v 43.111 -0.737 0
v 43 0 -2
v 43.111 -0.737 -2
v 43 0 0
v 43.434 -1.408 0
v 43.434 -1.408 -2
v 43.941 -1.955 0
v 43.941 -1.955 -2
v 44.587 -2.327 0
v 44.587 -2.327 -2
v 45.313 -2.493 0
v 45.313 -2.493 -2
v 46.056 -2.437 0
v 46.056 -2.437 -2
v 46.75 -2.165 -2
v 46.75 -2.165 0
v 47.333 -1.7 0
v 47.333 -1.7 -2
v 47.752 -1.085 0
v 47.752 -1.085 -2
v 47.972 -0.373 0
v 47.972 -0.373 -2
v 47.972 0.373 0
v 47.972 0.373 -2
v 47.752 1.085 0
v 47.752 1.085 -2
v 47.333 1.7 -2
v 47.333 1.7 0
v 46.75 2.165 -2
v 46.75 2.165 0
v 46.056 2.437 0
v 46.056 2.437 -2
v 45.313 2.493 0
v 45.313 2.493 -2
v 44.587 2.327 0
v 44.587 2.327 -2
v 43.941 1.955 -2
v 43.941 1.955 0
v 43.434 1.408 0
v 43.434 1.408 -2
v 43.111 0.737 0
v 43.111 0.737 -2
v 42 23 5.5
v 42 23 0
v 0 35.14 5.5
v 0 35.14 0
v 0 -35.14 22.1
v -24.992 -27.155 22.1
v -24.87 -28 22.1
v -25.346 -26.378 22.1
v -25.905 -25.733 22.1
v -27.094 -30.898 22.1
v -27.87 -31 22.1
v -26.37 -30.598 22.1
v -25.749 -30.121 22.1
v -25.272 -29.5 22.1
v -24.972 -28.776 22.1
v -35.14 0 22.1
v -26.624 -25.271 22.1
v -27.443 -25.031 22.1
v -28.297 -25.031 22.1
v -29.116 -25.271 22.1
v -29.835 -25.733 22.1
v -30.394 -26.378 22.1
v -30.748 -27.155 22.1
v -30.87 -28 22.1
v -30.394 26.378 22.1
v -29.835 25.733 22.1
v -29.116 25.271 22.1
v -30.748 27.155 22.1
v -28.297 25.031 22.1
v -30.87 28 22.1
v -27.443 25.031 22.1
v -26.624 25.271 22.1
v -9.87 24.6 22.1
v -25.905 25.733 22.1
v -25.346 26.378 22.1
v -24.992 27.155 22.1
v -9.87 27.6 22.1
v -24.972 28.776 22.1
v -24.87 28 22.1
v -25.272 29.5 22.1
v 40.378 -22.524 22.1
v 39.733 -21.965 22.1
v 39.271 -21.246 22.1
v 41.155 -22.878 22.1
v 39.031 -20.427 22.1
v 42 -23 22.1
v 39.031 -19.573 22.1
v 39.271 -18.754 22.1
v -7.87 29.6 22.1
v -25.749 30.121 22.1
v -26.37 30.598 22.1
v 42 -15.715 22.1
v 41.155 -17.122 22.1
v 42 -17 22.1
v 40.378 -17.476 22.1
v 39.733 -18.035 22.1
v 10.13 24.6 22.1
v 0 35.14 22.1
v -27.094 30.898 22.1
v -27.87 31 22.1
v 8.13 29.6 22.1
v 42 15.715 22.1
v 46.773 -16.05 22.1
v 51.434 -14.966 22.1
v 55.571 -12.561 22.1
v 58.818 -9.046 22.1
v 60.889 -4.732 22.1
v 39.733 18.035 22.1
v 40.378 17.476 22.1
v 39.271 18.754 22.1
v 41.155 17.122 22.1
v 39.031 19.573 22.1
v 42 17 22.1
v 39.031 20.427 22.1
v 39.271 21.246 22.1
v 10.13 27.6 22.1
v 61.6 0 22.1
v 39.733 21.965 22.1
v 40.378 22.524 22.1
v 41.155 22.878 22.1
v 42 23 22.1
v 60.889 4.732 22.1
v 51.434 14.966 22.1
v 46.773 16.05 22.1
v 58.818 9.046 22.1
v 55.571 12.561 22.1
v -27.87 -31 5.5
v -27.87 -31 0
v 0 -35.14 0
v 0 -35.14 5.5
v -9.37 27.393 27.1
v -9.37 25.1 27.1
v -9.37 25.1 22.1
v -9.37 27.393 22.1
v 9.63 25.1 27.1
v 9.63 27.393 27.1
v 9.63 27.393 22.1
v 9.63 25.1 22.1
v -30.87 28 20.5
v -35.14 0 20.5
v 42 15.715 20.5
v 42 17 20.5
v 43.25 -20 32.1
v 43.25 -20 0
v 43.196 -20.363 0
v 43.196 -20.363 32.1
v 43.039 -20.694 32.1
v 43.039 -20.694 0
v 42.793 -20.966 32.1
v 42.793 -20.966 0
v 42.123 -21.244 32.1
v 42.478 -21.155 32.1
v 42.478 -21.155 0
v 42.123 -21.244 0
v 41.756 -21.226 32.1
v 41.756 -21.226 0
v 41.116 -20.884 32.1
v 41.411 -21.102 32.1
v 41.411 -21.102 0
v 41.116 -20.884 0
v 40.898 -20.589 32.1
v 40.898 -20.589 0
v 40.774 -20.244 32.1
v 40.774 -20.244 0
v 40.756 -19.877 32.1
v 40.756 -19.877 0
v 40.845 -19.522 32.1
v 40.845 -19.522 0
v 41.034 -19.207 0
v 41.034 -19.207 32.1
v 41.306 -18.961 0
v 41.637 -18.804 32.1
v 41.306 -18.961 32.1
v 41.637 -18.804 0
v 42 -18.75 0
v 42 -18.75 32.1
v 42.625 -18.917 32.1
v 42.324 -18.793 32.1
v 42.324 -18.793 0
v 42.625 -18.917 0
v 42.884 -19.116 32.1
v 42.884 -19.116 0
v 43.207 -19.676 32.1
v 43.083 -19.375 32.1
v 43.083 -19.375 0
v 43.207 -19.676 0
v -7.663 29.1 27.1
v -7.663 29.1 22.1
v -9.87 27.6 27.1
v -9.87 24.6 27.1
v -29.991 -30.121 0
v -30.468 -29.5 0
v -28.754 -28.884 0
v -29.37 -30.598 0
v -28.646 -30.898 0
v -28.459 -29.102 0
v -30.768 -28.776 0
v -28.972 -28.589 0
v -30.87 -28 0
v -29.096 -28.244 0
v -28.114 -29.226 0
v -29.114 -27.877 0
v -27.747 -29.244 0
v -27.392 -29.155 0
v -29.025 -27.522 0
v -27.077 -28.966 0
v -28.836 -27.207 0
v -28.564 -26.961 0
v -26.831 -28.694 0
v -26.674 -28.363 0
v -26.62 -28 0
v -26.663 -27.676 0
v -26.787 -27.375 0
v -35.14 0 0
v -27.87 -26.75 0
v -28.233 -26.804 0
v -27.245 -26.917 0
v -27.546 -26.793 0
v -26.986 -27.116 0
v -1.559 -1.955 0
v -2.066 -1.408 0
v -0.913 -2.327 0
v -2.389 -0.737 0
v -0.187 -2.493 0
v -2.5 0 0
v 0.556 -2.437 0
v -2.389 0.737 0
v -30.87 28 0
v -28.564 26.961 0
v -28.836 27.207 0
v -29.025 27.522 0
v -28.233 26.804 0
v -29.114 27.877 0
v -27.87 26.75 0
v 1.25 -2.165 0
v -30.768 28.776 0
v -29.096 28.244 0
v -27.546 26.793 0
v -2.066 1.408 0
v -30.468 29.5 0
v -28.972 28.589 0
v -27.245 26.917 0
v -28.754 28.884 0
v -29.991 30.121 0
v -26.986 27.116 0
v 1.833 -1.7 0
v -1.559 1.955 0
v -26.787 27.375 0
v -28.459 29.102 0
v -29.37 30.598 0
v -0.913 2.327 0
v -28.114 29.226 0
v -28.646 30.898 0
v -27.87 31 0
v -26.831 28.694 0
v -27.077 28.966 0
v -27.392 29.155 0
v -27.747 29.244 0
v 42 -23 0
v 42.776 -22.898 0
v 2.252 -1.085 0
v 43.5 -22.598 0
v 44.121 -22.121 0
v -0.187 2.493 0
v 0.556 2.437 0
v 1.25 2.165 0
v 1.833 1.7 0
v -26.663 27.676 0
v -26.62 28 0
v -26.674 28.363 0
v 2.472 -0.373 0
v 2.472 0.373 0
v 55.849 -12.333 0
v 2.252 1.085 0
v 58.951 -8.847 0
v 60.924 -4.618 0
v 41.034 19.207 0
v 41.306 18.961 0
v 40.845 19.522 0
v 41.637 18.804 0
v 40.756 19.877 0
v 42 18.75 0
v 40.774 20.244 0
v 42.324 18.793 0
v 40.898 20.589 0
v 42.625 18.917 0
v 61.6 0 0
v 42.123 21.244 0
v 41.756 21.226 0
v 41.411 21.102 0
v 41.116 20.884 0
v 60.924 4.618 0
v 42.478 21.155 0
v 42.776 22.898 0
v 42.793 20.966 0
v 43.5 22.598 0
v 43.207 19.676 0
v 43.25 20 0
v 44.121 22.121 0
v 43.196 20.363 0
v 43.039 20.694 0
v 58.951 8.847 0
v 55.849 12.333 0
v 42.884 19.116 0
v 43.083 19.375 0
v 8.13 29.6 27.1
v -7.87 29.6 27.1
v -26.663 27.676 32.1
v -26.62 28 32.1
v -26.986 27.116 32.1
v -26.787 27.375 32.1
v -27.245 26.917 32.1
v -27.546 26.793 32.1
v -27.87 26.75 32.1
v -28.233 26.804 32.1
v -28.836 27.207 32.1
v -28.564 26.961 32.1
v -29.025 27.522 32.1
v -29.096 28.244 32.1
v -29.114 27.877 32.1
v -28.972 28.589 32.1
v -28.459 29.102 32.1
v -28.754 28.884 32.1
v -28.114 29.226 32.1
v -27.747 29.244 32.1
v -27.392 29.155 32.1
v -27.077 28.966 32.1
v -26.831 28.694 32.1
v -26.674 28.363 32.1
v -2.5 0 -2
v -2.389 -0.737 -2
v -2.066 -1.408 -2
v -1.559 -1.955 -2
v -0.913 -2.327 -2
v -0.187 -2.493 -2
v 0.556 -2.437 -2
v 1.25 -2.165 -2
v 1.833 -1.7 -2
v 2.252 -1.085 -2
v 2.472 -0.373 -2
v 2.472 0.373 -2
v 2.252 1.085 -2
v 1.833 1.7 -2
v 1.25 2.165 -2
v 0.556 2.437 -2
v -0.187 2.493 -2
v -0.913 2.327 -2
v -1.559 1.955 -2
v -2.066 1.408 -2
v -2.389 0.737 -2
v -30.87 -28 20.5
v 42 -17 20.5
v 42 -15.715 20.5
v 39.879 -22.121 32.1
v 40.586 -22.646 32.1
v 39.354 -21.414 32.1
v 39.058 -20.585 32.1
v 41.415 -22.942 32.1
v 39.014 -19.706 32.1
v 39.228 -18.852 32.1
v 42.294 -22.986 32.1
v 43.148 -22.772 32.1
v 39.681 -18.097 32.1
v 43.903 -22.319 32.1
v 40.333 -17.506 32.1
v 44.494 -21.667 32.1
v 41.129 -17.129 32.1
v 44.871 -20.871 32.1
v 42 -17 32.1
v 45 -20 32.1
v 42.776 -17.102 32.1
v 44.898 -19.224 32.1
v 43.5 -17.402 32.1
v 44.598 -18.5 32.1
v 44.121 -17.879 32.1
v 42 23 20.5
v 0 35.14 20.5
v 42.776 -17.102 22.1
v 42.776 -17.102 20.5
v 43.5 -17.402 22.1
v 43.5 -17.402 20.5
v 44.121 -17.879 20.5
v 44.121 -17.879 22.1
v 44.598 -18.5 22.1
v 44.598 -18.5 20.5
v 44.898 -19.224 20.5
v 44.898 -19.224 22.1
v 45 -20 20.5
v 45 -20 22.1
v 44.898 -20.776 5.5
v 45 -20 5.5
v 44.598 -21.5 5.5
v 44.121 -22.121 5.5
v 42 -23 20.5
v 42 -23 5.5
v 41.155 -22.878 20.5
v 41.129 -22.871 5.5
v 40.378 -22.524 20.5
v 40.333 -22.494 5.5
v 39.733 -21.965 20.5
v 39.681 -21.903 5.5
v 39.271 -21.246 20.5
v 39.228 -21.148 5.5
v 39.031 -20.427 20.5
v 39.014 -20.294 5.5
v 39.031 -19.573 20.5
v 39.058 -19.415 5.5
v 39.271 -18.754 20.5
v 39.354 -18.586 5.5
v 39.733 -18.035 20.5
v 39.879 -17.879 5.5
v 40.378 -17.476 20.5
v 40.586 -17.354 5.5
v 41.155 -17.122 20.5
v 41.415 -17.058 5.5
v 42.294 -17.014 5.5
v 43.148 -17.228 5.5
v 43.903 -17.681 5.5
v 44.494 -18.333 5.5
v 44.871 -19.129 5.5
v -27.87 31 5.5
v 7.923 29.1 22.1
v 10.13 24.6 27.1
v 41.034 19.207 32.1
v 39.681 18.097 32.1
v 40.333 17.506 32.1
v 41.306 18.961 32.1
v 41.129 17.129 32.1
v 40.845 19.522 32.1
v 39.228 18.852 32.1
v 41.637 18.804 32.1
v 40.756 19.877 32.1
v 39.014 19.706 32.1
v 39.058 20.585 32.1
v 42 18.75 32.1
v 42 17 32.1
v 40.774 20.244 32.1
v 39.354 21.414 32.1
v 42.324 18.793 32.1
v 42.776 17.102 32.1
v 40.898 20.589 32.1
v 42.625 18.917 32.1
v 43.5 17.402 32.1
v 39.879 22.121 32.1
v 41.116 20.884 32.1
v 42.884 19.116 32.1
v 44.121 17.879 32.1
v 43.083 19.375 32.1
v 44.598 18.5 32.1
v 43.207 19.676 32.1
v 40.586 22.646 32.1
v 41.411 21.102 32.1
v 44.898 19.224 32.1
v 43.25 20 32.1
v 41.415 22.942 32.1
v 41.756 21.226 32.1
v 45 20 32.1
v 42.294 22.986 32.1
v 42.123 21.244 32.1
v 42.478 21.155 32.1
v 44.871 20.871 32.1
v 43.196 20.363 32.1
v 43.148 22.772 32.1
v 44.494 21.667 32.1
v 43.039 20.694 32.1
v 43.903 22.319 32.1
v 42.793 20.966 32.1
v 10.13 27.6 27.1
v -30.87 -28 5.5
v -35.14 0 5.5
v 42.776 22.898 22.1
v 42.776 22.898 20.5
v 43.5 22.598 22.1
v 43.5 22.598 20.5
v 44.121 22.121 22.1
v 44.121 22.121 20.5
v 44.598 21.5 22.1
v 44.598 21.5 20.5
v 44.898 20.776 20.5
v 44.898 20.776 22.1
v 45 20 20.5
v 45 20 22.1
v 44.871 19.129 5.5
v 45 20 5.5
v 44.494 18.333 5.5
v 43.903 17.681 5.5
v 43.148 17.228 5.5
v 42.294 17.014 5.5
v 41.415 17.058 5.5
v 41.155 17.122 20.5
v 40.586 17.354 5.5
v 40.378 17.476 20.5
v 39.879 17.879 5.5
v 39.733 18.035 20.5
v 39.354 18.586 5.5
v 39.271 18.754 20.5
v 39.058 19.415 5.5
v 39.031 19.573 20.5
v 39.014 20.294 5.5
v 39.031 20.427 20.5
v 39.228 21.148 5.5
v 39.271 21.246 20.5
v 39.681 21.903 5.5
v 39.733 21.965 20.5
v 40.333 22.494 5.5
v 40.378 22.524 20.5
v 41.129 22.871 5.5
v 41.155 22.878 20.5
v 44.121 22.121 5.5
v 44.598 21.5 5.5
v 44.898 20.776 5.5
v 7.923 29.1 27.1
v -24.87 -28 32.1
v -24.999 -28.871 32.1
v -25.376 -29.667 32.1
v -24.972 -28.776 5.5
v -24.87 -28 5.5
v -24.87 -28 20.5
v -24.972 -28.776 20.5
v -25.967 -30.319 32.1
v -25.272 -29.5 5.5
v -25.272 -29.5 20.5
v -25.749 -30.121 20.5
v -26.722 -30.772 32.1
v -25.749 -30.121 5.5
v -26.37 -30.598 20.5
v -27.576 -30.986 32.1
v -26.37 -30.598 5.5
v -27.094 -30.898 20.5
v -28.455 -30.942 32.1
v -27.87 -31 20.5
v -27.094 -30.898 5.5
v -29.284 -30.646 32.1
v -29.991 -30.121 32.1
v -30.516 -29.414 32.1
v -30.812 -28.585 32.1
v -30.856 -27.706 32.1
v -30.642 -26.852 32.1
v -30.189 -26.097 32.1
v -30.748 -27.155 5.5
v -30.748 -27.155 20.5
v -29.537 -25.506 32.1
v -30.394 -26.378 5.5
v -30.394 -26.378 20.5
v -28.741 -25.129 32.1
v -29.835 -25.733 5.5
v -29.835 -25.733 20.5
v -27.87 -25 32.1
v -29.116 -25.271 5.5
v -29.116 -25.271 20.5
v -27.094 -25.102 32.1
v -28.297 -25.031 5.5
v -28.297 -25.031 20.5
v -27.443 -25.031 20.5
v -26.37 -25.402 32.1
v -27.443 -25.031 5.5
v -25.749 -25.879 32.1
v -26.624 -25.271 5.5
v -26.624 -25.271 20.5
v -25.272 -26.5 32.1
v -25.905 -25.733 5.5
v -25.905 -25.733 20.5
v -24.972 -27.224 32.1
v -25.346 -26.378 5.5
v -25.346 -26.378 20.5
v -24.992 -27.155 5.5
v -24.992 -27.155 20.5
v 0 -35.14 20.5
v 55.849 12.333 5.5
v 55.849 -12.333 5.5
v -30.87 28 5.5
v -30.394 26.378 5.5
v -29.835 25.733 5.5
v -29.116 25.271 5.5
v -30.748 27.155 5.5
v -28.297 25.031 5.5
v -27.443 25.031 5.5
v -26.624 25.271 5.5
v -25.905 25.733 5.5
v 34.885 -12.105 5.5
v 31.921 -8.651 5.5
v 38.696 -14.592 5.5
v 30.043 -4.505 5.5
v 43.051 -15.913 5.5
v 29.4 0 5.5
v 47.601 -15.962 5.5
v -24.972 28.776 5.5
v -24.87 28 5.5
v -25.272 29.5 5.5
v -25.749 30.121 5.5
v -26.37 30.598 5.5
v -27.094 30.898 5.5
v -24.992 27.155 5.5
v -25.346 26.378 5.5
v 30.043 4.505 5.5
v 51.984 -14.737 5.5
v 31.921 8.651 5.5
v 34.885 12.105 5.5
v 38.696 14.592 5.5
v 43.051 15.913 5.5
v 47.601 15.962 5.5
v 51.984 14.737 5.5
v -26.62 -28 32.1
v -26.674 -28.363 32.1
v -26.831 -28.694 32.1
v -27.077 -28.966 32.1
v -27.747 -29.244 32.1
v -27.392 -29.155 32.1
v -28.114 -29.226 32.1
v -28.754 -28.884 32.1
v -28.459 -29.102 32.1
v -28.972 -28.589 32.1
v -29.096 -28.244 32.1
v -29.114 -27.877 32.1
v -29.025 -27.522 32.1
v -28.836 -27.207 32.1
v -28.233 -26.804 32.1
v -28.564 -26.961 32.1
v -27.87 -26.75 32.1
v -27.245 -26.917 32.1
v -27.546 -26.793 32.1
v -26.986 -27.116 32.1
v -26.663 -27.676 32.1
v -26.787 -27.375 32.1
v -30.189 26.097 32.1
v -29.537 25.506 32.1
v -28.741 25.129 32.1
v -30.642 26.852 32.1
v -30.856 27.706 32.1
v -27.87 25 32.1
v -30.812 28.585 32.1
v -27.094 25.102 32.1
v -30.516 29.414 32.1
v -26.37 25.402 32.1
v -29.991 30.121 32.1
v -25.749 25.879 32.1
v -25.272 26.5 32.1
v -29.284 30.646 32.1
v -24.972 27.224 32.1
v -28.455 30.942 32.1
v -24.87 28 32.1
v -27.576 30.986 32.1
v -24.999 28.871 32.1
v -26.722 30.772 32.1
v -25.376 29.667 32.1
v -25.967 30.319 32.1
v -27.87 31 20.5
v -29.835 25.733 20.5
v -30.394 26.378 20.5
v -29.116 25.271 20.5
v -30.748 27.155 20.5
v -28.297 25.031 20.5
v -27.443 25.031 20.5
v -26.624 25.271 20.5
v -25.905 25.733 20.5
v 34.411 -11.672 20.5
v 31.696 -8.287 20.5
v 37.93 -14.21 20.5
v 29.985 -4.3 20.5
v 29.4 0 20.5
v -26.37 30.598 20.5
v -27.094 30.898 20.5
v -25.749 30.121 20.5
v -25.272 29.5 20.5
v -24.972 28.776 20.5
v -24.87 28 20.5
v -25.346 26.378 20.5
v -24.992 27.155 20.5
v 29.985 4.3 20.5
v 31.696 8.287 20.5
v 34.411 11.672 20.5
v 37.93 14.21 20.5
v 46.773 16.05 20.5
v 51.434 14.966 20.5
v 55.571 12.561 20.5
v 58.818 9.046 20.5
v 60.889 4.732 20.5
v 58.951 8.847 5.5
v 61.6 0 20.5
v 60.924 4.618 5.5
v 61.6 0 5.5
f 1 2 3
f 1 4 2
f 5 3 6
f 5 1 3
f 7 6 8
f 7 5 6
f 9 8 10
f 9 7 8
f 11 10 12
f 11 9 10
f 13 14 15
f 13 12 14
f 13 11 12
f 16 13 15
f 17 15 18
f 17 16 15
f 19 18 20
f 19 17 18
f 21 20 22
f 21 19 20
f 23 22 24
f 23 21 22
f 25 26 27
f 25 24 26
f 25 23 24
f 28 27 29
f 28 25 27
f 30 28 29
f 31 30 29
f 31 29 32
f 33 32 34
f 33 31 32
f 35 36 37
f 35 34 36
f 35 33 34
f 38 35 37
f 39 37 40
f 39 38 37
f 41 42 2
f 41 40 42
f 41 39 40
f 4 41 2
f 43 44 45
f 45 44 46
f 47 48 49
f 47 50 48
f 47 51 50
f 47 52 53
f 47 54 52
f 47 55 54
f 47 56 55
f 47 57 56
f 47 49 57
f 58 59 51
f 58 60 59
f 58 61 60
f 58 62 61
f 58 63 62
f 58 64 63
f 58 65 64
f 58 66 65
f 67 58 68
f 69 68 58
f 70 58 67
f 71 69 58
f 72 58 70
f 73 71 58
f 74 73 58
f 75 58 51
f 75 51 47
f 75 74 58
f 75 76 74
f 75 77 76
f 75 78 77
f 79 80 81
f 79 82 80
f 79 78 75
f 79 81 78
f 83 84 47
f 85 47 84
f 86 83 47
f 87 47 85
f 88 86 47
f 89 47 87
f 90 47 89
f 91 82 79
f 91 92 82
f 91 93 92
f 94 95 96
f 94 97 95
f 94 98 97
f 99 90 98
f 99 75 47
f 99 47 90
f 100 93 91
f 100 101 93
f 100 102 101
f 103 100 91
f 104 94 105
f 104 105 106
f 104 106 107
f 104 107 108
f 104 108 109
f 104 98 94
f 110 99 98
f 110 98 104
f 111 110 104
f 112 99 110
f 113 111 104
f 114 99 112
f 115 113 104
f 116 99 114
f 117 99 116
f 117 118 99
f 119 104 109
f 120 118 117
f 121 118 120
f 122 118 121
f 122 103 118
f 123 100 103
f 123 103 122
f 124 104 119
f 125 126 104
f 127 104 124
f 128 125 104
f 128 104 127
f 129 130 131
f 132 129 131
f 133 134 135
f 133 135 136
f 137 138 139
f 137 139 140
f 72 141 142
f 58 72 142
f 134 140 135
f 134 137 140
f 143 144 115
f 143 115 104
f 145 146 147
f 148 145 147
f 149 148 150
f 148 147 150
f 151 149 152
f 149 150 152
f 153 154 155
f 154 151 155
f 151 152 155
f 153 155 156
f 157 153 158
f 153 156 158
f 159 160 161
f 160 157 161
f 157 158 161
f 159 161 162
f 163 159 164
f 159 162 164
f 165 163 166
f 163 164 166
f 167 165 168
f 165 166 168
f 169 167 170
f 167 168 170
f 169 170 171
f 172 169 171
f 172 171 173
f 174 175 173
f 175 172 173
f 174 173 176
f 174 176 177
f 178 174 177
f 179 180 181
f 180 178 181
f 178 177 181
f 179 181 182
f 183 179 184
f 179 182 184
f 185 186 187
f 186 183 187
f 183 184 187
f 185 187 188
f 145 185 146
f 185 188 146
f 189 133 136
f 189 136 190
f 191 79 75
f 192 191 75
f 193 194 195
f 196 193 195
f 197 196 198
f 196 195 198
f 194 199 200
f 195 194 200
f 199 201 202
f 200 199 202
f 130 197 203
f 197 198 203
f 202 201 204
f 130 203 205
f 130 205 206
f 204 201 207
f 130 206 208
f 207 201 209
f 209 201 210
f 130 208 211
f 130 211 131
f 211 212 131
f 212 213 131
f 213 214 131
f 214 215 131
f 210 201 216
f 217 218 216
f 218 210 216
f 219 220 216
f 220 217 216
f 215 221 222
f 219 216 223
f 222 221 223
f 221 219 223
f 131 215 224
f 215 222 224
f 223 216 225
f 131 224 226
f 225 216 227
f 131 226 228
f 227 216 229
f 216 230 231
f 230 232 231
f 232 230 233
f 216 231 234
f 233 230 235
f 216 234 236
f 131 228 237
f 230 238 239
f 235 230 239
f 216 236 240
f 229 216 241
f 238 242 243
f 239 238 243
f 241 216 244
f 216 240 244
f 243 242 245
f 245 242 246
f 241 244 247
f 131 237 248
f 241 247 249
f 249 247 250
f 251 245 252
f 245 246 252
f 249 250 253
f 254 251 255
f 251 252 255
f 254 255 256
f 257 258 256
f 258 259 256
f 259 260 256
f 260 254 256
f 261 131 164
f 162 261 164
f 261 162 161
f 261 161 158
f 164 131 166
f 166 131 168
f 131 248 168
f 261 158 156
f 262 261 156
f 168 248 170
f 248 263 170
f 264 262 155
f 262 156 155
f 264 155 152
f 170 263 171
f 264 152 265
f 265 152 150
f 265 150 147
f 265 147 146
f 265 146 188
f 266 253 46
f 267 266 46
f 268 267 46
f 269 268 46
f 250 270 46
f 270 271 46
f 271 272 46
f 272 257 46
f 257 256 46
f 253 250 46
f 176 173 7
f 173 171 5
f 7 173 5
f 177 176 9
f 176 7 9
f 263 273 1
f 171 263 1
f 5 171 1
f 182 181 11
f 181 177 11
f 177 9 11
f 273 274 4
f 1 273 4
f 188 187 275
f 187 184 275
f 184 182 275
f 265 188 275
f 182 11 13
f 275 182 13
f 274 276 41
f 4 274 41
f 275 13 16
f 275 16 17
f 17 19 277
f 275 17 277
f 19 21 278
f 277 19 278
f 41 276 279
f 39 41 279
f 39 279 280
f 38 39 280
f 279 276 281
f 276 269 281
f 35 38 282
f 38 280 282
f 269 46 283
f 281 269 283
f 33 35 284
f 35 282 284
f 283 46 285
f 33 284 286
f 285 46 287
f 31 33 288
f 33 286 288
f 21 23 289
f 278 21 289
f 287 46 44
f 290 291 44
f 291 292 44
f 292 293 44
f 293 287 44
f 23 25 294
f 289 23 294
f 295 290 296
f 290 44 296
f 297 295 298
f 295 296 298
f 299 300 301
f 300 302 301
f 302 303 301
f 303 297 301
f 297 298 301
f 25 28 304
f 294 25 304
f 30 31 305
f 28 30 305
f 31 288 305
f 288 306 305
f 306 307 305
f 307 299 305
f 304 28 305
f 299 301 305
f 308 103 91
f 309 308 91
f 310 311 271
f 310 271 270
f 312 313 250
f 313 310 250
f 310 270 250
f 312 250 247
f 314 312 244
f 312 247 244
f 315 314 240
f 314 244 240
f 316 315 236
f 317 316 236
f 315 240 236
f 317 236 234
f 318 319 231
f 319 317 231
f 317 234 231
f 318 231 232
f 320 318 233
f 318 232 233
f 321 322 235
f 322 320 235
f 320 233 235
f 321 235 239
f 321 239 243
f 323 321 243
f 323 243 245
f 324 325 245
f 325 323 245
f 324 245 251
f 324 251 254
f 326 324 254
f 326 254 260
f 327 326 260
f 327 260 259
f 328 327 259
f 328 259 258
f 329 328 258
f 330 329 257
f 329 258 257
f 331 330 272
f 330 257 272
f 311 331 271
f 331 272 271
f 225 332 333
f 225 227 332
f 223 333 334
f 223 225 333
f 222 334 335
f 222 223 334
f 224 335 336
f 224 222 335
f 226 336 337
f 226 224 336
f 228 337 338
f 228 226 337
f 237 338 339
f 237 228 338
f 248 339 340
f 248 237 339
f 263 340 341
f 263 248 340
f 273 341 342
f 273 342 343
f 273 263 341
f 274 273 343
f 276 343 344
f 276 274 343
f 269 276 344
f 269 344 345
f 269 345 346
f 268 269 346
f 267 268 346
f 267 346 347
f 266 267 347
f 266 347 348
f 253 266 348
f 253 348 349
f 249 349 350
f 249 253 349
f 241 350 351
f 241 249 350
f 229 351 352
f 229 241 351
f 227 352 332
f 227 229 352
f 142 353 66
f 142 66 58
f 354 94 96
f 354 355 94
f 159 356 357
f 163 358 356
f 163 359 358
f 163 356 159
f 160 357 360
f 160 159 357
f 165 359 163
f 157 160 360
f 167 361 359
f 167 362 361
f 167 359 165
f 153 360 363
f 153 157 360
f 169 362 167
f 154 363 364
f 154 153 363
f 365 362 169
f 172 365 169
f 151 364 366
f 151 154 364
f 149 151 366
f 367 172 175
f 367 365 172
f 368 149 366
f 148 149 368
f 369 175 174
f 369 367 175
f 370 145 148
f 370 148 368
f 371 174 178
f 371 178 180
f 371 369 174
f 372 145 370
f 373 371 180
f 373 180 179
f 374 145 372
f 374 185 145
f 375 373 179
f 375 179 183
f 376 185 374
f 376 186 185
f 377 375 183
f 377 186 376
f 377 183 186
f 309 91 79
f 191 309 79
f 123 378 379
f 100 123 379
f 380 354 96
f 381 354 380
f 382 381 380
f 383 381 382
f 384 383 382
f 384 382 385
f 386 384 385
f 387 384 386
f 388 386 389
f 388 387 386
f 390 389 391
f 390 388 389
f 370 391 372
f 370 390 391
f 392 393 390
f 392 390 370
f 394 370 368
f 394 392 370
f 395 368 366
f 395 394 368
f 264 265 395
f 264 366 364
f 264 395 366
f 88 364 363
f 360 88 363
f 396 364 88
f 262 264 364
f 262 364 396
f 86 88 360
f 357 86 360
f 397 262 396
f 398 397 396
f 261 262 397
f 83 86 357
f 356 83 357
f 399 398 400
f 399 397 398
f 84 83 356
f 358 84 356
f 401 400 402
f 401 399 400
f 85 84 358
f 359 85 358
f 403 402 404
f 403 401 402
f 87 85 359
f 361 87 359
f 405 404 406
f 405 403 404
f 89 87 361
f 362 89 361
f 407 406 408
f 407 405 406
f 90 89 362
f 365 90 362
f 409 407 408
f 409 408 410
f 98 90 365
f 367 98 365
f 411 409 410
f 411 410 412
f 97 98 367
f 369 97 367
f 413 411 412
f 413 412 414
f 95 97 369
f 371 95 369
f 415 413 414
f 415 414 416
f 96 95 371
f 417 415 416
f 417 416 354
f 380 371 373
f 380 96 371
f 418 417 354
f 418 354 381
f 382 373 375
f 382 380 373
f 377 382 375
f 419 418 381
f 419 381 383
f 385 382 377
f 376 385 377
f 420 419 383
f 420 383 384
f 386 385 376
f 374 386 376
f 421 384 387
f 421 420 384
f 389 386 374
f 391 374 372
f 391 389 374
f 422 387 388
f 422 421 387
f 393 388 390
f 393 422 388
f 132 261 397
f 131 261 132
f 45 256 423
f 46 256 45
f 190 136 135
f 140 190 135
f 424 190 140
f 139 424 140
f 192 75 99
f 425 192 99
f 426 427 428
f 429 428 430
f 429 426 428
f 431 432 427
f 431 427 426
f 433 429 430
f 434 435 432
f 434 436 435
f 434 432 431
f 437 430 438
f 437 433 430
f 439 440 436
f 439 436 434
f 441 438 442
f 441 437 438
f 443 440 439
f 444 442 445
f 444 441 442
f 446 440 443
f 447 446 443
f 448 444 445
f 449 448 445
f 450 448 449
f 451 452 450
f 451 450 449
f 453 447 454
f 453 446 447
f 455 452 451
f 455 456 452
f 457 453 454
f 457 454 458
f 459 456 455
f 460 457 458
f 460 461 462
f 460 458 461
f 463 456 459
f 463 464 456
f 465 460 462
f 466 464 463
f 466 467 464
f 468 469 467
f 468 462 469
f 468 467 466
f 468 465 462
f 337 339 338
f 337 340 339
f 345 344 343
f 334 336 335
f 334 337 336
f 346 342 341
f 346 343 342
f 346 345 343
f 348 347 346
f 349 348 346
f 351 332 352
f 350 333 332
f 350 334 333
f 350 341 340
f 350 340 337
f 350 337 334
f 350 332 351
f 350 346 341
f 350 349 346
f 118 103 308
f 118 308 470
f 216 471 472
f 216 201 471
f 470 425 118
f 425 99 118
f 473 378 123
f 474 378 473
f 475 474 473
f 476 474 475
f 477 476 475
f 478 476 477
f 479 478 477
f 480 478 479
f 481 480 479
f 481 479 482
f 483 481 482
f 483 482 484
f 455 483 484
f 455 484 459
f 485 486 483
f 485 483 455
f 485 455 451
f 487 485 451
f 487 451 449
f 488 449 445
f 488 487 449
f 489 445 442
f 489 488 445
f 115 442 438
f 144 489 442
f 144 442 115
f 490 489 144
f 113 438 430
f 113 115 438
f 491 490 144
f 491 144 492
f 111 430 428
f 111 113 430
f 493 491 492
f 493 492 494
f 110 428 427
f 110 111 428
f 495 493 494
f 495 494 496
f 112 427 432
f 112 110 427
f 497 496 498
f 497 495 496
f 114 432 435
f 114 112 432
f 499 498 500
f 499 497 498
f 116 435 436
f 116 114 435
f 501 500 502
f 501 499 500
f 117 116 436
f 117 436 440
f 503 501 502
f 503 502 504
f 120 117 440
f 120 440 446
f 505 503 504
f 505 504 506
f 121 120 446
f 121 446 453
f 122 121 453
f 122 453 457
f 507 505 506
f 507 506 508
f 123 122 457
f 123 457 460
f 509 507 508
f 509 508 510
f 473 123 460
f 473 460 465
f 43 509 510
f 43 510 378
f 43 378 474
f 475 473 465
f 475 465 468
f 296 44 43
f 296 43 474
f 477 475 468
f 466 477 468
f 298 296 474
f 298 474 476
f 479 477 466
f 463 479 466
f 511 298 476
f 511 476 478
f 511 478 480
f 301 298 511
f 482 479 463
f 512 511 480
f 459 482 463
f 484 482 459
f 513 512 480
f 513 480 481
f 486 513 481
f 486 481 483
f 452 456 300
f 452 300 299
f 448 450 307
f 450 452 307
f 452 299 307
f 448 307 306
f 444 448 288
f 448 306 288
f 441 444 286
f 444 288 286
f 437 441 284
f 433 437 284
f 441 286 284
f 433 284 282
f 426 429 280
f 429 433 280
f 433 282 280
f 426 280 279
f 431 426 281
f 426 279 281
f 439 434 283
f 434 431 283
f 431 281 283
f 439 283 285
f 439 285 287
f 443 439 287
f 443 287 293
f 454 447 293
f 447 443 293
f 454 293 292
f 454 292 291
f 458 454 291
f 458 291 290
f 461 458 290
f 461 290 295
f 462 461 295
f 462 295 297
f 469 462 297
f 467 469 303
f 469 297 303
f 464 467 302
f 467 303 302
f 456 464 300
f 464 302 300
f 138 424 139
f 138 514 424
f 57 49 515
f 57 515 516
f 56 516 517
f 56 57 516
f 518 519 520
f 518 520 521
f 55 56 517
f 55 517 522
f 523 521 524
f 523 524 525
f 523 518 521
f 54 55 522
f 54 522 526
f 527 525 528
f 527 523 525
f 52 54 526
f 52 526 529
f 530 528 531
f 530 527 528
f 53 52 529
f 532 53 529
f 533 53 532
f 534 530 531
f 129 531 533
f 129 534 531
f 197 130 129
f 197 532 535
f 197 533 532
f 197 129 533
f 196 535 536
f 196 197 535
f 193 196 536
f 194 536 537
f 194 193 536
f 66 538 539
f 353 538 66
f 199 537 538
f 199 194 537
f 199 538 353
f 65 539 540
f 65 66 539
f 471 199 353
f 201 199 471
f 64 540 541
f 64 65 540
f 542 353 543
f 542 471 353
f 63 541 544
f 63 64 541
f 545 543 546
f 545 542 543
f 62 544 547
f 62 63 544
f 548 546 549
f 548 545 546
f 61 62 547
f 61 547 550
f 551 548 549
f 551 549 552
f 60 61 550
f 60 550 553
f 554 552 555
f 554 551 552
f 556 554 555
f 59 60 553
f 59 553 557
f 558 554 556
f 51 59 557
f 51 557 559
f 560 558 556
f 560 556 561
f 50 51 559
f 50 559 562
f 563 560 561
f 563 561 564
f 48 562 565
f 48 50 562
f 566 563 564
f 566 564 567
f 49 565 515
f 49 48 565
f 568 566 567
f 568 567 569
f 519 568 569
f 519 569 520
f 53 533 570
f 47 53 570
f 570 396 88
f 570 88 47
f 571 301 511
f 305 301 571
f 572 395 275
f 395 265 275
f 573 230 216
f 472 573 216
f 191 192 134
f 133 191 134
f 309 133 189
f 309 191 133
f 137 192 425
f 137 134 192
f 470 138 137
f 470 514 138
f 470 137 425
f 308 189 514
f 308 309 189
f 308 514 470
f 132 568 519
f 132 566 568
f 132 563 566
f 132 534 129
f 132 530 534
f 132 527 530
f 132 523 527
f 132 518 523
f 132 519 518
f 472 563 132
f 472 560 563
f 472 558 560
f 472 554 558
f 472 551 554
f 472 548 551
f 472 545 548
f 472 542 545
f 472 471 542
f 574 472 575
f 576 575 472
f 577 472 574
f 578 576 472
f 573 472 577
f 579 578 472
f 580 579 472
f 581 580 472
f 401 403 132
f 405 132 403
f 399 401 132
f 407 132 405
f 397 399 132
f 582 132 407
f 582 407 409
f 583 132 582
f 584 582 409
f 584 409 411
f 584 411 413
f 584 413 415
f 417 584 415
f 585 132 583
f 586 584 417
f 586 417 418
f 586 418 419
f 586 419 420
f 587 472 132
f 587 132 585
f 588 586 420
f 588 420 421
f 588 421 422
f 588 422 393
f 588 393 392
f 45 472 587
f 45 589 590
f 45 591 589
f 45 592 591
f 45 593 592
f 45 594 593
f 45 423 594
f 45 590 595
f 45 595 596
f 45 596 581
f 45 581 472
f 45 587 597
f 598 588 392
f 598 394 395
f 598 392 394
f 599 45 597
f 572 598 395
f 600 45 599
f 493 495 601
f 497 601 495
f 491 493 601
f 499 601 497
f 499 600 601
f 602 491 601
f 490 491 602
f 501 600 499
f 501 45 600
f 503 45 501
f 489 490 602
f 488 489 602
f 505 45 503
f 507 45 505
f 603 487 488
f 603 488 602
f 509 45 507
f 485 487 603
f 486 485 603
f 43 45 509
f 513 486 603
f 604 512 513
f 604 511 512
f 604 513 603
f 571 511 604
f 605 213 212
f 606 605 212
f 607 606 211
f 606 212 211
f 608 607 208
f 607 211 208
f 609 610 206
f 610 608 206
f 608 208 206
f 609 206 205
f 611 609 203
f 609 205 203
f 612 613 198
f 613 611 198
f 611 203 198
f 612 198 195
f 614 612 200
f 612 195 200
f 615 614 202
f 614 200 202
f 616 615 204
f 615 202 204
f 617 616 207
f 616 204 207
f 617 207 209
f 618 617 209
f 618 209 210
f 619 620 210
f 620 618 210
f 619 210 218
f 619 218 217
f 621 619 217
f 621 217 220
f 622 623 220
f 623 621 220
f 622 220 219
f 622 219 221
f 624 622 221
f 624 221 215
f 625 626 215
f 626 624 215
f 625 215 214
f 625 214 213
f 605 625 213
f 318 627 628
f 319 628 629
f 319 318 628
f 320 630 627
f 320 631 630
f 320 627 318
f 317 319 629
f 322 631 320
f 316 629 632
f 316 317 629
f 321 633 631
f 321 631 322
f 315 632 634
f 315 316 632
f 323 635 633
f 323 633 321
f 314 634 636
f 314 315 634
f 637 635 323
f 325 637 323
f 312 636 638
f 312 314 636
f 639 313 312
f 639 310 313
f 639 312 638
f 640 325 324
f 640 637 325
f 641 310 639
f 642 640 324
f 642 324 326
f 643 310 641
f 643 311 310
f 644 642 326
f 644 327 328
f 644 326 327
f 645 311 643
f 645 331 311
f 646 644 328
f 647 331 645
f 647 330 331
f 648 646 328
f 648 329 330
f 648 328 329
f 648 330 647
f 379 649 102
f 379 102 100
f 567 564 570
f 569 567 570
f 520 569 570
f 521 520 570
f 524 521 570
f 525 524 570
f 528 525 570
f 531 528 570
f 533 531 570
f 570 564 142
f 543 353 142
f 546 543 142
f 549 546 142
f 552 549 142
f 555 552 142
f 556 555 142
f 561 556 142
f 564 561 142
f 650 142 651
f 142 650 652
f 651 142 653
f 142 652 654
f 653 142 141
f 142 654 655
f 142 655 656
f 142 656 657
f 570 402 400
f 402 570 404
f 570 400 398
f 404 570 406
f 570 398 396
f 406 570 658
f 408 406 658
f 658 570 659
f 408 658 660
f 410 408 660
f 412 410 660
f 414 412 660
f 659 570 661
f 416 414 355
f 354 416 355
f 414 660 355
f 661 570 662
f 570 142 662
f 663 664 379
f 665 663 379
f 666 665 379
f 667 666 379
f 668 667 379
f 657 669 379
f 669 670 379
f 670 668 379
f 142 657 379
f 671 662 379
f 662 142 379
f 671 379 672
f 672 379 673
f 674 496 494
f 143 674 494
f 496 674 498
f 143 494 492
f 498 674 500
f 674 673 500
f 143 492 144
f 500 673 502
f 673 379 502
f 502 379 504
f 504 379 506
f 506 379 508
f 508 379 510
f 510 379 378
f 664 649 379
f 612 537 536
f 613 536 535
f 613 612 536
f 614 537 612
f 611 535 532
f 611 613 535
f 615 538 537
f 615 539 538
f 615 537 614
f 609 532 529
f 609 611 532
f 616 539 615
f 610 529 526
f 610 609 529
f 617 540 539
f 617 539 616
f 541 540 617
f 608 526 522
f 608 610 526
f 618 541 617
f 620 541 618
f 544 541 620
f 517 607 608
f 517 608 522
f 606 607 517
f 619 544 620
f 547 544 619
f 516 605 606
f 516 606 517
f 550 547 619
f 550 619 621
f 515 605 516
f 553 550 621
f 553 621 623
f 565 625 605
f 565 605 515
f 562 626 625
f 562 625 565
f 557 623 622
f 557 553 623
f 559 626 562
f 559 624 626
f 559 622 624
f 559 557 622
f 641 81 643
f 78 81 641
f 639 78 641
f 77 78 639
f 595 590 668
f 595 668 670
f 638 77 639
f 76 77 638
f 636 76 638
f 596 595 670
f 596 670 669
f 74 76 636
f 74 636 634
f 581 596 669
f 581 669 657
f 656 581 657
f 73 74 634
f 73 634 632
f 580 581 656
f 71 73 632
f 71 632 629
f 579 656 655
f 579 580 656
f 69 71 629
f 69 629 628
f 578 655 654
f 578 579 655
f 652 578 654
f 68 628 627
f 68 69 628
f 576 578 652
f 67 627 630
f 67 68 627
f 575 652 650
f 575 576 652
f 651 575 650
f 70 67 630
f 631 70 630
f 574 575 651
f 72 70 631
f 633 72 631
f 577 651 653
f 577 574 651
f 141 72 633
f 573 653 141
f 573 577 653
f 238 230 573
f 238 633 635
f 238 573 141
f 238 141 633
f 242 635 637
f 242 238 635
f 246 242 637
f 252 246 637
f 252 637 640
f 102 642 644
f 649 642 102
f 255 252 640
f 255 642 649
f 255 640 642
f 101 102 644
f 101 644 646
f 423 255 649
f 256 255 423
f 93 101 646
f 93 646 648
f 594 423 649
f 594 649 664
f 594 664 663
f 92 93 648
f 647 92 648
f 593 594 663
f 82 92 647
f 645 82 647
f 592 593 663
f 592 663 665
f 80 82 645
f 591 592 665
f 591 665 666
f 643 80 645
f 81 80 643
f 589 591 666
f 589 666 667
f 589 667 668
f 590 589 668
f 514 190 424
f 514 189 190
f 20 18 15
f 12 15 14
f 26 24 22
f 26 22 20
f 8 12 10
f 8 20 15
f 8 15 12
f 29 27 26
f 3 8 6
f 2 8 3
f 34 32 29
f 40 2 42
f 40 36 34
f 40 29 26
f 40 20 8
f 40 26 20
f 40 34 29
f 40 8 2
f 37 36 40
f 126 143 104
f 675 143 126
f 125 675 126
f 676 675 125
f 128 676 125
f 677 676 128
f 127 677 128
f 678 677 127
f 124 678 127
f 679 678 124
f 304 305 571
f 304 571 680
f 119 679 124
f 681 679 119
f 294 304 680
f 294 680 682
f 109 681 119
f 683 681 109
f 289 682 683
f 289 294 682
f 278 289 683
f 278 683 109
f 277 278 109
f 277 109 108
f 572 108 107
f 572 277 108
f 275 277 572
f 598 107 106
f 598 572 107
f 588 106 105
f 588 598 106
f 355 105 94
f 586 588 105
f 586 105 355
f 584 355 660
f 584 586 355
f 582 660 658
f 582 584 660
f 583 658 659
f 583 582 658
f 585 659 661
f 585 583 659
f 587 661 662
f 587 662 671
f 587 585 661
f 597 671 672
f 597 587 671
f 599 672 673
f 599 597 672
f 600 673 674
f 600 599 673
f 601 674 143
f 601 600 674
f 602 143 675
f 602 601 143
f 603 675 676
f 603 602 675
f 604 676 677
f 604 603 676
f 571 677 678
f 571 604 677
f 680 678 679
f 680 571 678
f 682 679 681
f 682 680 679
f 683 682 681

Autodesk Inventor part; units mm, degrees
ref_plane "YZ Plane" through (0, 0, 0) normal (1, 0, 0) x (0, 1, 0)
ref_plane "XZ Plane" through (0, 0, 0) normal (0, 1, 0) x (-1, 0, 0)
ref_plane "XY Plane" through (0, 0, 0) normal (0, 0, 1) x (1, 0, 0)
sketch "스케치1" plane through (0, 0, 0) normal (0, 0, 1) x (1, 0, 0)
  line L0 (0, 0) -> (-35.14, 0)
  line L1 (-35.14, 0) -> (61.6, 0)
  line L2 (0, 35.14) -> (0, -35.14)
  line L3 (-35.14, -35.14) -> (61.6, -35.14)
  line L4 (61.6, -35.14) -> (61.6, 35.14)
  line L5 (61.6, 35.14) -> (-35.14, 35.14)
  line L6 (-35.14, 35.14) -> (-35.14, -35.14)
  line L7 (0, 0) -> (-27.87, 0)
  line L8 (0, 0) -> (42, 0)
  line L9 (42, 20) -> (42, -20)
  circle A0 centre (42, -20) radius 1.25
  circle A1 centre (42, 20) radius 1.25
  line L10 (0, 0) -> (45.5, 0)
  circle A2 centre (45.5, 0) radius 9
  circle A3 centre (45.5, 0) radius 16.1
  circle A4 centre (42, -20) radius 3
  circle A5 centre (42, 20) radius 3
  line L11 (45.5, 0) -> (61.6, 0) construction
  line L12 (42, 20) -> (45, 20) construction
  line L13 (44.1213, 22.1213) -> (55.8489, 12.3333)
  line L14 (42, 23) -> (0, 35.14)
  line L15 (-27.87, 28) -> (-27.87, -28)
  circle A6 centre (-27.87, 28) radius 1.25
  circle A7 centre (-27.87, 28) radius 3
  circle A8 centre (-27.87, -28) radius 1.25
  circle A9 centre (-27.87, -28) radius 3
  line L16 (-27.87, 31) -> (0, 35.14)
  line L17 (-30.87, 28) -> (-35.14, 0)
  line L18 (44.1213, -22.1213) -> (55.8489, -12.3333)
  line L19 (42, -23) -> (0, -35.14)
  line L20 (-27.87, -31) -> (0, -35.14)
  line L21 (-30.87, -28) -> (-35.14, 0)
  dimension "d20" = 6
  dimension "d0" = 35.14
  dimension "d1" = 96.74
  dimension "d3" = 70.28
  dimension "d4" = 27.87
  dimension "d9" = 42
  dimension "d11" = 40
  dimension "d12" = 2.5
  dimension "d13" = 2.5
  dimension "d14" = 45.5
  dimension "d15" = 18
  dimension "d16" = 32.2
  dimension "d19" = 6
  dimension "d27" = 56
  dimension "d28" = 2.5
  dimension "d29" = 6
  dimension "d30" = 2.5
  dimension "d31" = 6
extrude "돌출1" add sketch "스케치1" along normal blind 5.5 contours L2 L20 A9 L15 L0 | L2 L14 A5 L9 A3 L1 | L0 L15 A7 L16 L2 | L1 A3 L9 A4 L19 L2 | L15 A9 L21 L0 | L0 L17 A7 L15 | A3 L9 A2 L1 | L1 A2 L9 A3 | A3 L1 A2 L9 | L18 A4 L9 A3 | A7 | A9 | A2 L9 L1 | L1 L9 A2 | L9 A5 L13 A3 | L9 A2 L1 A3 | A5 | A4 | L9 A2 L1 | L1 A2 L9
sketch "스케치2" plane through (0, 0, 5.5) normal (0, 0, 1) x (1, 0, 0)
  line L0 (0, 0) -> (-35.14, 0)
  line L1 (-35.14, 0) -> (61.6, 0)
  line L2 (0, 35.14) -> (0, -35.14)
  line L3 (-35.14, -35.14) -> (61.6, -35.14)
  line L4 (61.6, -35.14) -> (61.6, 35.14)
  line L5 (61.6, 35.14) -> (-35.14, 35.14)
  line L6 (-35.14, 35.14) -> (-35.14, -35.14)
  line L7 (0, 0) -> (-27.87, 0)
  line L8 (0, 0) -> (42, 0)
  line L9 (42, 20) -> (42, -20)
  circle A0 centre (42, -20) radius 1.25
  circle A1 centre (42, 20) radius 1.25
  line L10 (0, 0) -> (45.5, 0)
  circle A2 centre (45.5, 0) radius 9
  circle A3 centre (45.5, 0) radius 16.1
  circle A4 centre (42, -20) radius 3
  circle A5 centre (42, 20) radius 3
  line L11 (45.5, 0) -> (61.6, 0) construction
  line L12 (42, 20) -> (45, 20) construction
  line L13 (44.1213, 22.1213) -> (55.8489, 12.3333)
  line L14 (42, 23) -> (0, 35.14)
  line L15 (-27.87, 28) -> (-27.87, -28)
  circle A6 centre (-27.87, 28) radius 1.25
  circle A7 centre (-27.87, 28) radius 3
  circle A8 centre (-27.87, -28) radius 1.25
  circle A9 centre (-27.87, -28) radius 3
  line L16 (-27.87, 31) -> (0, 35.14)
  line L17 (-30.87, 28) -> (-35.14, 0)
  line L18 (-27.87, -31) -> (0, -35.14)
  line L19 (-30.87, -28) -> (-35.14, 0)
  line L20 (42, -23) -> (0, -35.14)
  line L21 (44.1213, -22.1213) -> (55.8489, -12.3333)
  point P0 (55.7837, -12.3877)
  point P1 (55.7837, 12.3877)
  dimension "d46" = 6
  dimension "d34" = 35.14
  dimension "d35" = 96.74
  dimension "d36" = 70.28
  dimension "d37" = 27.87
  dimension "d38" = 42
  dimension "d39" = 40
  dimension "d40" = 2.5
  dimension "d41" = 2.5
  dimension "d42" = 45.5
  dimension "d43" = 18
  dimension "d44" = 32.2
  dimension "d45" = 6
  dimension "d47" = 56
  dimension "d48" = 2.5
  dimension "d49" = 6
  dimension "d50" = 2.5
  dimension "d51" = 6
extrude "돌출2" add sketch "스케치2" along normal blind 15 contours A3 L9 A2 L1 | L1 A2 L9 A3 | A3 L1 A2 L9 | A7 | A9 | A2 L9 L1 | L1 L9 A2 | L9 A2 L1 A3 | A5 | A4 | L9 A2 L1 | L1 A2 L9
sketch "스케치3" plane through (0, 0, 20.5) normal (0, 0, 1) x (1, 0, 0)
  line L0 (0, 0) -> (-35.14, 0)
  line L1 (-35.14, 0) -> (61.6, 0)
  line L2 (0, 35.14) -> (0, -35.14)
  line L3 (-35.14, -35.14) -> (61.6, -35.14)
  line L4 (61.6, -35.14) -> (61.6, 35.14)
  line L5 (61.6, 35.14) -> (-35.14, 35.14)
  line L6 (-35.14, 35.14) -> (-35.14, -35.14)
  line L7 (0, 0) -> (-27.87, 0)
  line L8 (0, 0) -> (42, 0)
  line L9 (42, 20) -> (42, -20)
  circle A0 centre (42, -20) radius 1.25
  circle A1 centre (42, 20) radius 1.25
  line L10 (0, 0) -> (45.5, 0)
  circle A2 centre (45.5, 0) radius 9
  circle A3 centre (45.5, 0) radius 16.1
  circle A4 centre (42, -20) radius 3
  circle A5 centre (42, 20) radius 3
  line L11 (45.5, 0) -> (61.6, 0) construction
  line L12 (42, 20) -> (45, 20) construction
  line L13 (44.1213, 22.1213) -> (55.8489, 12.3333)
  line L14 (42, 23) -> (0, 35.14)
  line L15 (-27.87, 28) -> (-27.87, -28)
  circle A6 centre (-27.87, 28) radius 1.25
  circle A7 centre (-27.87, 28) radius 3
  circle A8 centre (-27.87, -28) radius 1.25
  circle A9 centre (-27.87, -28) radius 3
  line L16 (-27.87, 31) -> (0, 35.14)
  line L17 (-30.87, 28) -> (-35.14, 0)
  line L18 (-27.87, -31) -> (0, -35.14)
  line L19 (-30.87, -28) -> (-35.14, 0)
  line L20 (42, -23) -> (0, -35.14)
  line L21 (44.1213, -22.1213) -> (55.8489, -12.3333)
  point P0 (42, -15.715)
  point P1 (55.7837, -12.3877)
  point P2 (55.7837, 12.3877)
  point P3 (42, 15.715)
  point P4 (42, 17)
  point P5 (42, -17)
  dimension "d66" = 6
  dimension "d54" = 35.14
  dimension "d55" = 96.74
  dimension "d56" = 70.28
  dimension "d57" = 27.87
  dimension "d58" = 42
  dimension "d59" = 40
  dimension "d60" = 2.5
  dimension "d61" = 2.5
  dimension "d62" = 45.5
  dimension "d63" = 18
  dimension "d64" = 32.2
  dimension "d65" = 6
  dimension "d67" = 56
  dimension "d68" = 2.5
  dimension "d69" = 6
  dimension "d70" = 2.5
  dimension "d71" = 6
extrude "돌출3" add sketch "스케치3" along normal blind 1.6 contours L2 L18 A9 L15 L0 | L2 L14 A5 L9 A3 L1 | L0 L15 A7 L16 L2 | L1 A3 L9 A4 L20 L2 | L15 A9 L19 L0 | L0 L17 A7 L15 | A3 L9 A2 L1 | L1 A2 L9 A3 | A3 L1 A2 L9 | A7 | A9 | A2 L9 L1 | L1 L9 A2 | L9 A2 L1 A3 | A5 | A4 | L9 A2 L1 | L1 A2 L9
sketch "스케치4" plane through (0, 0, 22.1) normal (0, 0, 1) x (1, 0, 0)
  line L0 (0, 0) -> (-35.14, 0)
  line L1 (-35.14, 0) -> (61.6, 0)
  line L2 (0, 35.14) -> (0, -35.14)
  line L3 (-35.14, -35.14) -> (61.6, -35.14)
  line L4 (61.6, -35.14) -> (61.6, 35.14)
  line L5 (61.6, 35.14) -> (-35.14, 35.14)
  line L6 (-35.14, 35.14) -> (-35.14, -35.14)
  line L7 (0, 0) -> (-27.87, 0)
  line L8 (0, 0) -> (42, 0)
  line L9 (42, 20) -> (42, -20)
  circle A0 centre (42, -20) radius 1.25
  circle A1 centre (42, 20) radius 1.25
  line L10 (0, 0) -> (45.5, 0)
  circle A2 centre (45.5, 0) radius 9
  circle A3 centre (45.5, 0) radius 16.1
  circle A4 centre (42, -20) radius 3
  circle A5 centre (42, 20) radius 3
  line L11 (45.5, 0) -> (61.6, 0) construction
  line L12 (42, 20) -> (45, 20) construction
  line L13 (44.1213, 22.1213) -> (55.8489, 12.3333)
  line L14 (42, 23) -> (0, 35.14)
  line L15 (-27.87, 28) -> (-27.87, -28)
  circle A6 centre (-27.87, 28) radius 1.25
  circle A7 centre (-27.87, 28) radius 3
  circle A8 centre (-27.87, -28) radius 1.25
  circle A9 centre (-27.87, -28) radius 3
  line L16 (-27.87, 31) -> (0, 35.14)
  line L17 (-30.87, 28) -> (-35.14, 0)
  line L18 (-27.87, -31) -> (0, -35.14)
  line L19 (-30.87, -28) -> (-35.14, 0)
  line L20 (42, -23) -> (0, -35.14)
  line L21 (44.1213, -22.1213) -> (55.8489, -12.3333)
  dimension "d86" = 6
  dimension "d74" = 35.14
  dimension "d75" = 96.74
  dimension "d76" = 70.28
  dimension "d77" = 27.87
  dimension "d78" = 42
  dimension "d79" = 40
  dimension "d80" = 2.5
  dimension "d81" = 2.5
  dimension "d82" = 45.5
  dimension "d83" = 18
  dimension "d84" = 32.2
  dimension "d85" = 6
  dimension "d87" = 56
  dimension "d88" = 2.5
  dimension "d89" = 6
  dimension "d90" = 2.5
  dimension "d91" = 6
extrude "돌출4" add sketch "스케치4" along normal blind 10 contours A7 | A9 | A5 | A4
sketch "스케치5" plane through (0, 0, 0) normal (0, 0, -1) x (-1, 0, 0)
  line L0 (27.87, -31) -> (0, -35.14) projected
  arc A0 (27.87, -31) -> (30.87, -28) centre (27.87, -28) ccw projected
  line L1 (35.14, 0) -> (30.87, -28) projected
  line L2 (30.87, 28) -> (35.14, 0) projected
  arc A1 (30.87, 28) -> (27.87, 31) centre (27.87, 28) ccw projected
  line L3 (0, 35.14) -> (27.87, 31) projected
  line L4 (-42, 23) -> (0, 35.14) projected
  arc A2 (-42, 23) -> (-44.1213, 22.1213) centre (-42, 20) ccw projected
  line L5 (-55.8489, 12.3333) -> (-44.1213, 22.1213) projected
  arc A3 (-55.8489, 12.3333) -> (-55.8489, -12.3333) centre (-45.5, 0) ccw projected
  line L6 (-44.1213, -22.1213) -> (-55.8489, -12.3333) projected
  arc A4 (-44.1213, -22.1213) -> (-42, -23) centre (-42, -20) ccw projected
  line L7 (0, -35.14) -> (-42, -23) projected
  circle A5 centre (-42, 20) radius 1.25 projected
  circle A6 centre (27.87, 28) radius 1.25 projected
  circle A7 centre (27.87, -28) radius 1.25 projected
  circle A8 centre (-42, -20) radius 1.25 projected
  line L8 (0, -35.14) -> (0, 35.14)
  line L9 (0, 0) -> (-45.5, 0)
  circle A9 centre (0, 0) radius 2.5
  circle A10 centre (-45.5, 0) radius 2.5
  dimension "d94" = 5
  dimension "d95" = 5
extrude "돌출5" add sketch "스케치5" along normal blind 2 contours A10 | A9 L9 L8 | L8 A9 | L9 A9 L8
sketch "스케치6" plane through (0, 0, 22.1) normal (0, 0, 1) x (1, 0, 0)
  arc A0 (42, -17) -> (42, -23) centre (42, -20) ccw projected
  line L0 (42, -17) -> (42, -15.715) projected
  arc A1 (42, -15.715) -> (55.7837, -12.3877) centre (45.5, 0) ccw projected
  line L1 (55.7837, -12.3877) -> (55.8489, -12.3333) projected
  arc A2 (55.8489, -12.3333) -> (55.8489, 12.3333) centre (45.5, 0) ccw projected
  line L2 (55.8489, 12.3333) -> (55.7837, 12.3877) projected
  arc A3 (55.7837, 12.3877) -> (42, 15.715) centre (45.5, 0) ccw projected
  line L3 (42, 15.715) -> (42, 17) projected
  arc A4 (42, 23) -> (42, 17) centre (42, 20) ccw projected
  line L4 (42, 23) -> (0, 35.14) projected
  line L5 (0, 35.14) -> (-27.87, 31) projected
  arc A5 (-30.87, 28) -> (-27.87, 31) centre (-27.87, 28) ccw projected
  line L6 (-30.87, 28) -> (-35.14, 0) projected
  line L7 (-35.14, 0) -> (-30.87, -28) projected
  arc A6 (-27.87, -31) -> (-30.87, -28) centre (-27.87, -28) ccw projected
  line L8 (-27.87, -31) -> (0, -35.14) projected
  line L9 (0, -35.14) -> (42, -23) projected
  circle A7 centre (-27.87, 28) radius 3 projected
  circle A8 centre (-27.87, 28) radius 1.25 projected
  circle A9 centre (-27.87, -28) radius 3 projected
  circle A10 centre (-27.87, -28) radius 1.25 projected
  circle A11 centre (42, -20) radius 1.25 projected
  circle A12 centre (42, -20) radius 3 projected
  circle A13 centre (42, -20) radius 1.25 projected
  circle A14 centre (42, 20) radius 3 projected
  circle A15 centre (42, 20) radius 1.25 projected
  line L10 (-27.87, 28) -> (-27.87, 24.6)
  line L11 (-27.87, 24.6) -> (-9.87, 24.6)
  line L12 (-9.87, 24.6) -> (10.13, 24.6)
  line L13 (10.13, 24.6) -> (10.13, 29.6)
  line L14 (10.13, 29.6) -> (-9.87, 29.6)
  line L15 (-9.87, 29.6) -> (-9.87, 24.6)
  line L16 (-9.87, 29.6) -> (-7.87, 29.6)
  line L17 (-7.87, 29.6) -> (-9.87, 27.6)
  line L18 (10.13, 29.6) -> (8.13, 29.6)
  line L19 (8.13, 29.6) -> (10.13, 27.6)
  point P0 (0, 0)
  dimension "d98" = 3.4
  dimension "d99" = 18
  dimension "d100" = 20
  dimension "d101" = 5
  dimension "d102" = 2
  dimension "d103" = 45
  dimension "d104" = 2
extrude "돌출6" add sketch "스케치6" along normal blind 5 contours L15 L17 L14 L19 L13 L12
sketch "스케치7" plane through (0, 0, 27.1) normal (0, 0, 1) x (1, 0, 0)
  line L0 (8.13, 29.6) -> (-7.87, 29.6) projected
  line L1 (-7.87, 29.6) -> (-9.87, 27.6) projected
  line L2 (-9.87, 27.6) -> (-9.87, 24.6) projected
  line L3 (-9.87, 24.6) -> (10.13, 24.6) projected
  line L4 (10.13, 24.6) -> (10.13, 27.6) projected
  line L5 (10.13, 27.6) -> (8.13, 29.6) projected
  line L6 (-9.37, 27.3929) -> (-7.6629, 29.1)
  line L7 (-7.6629, 29.1) -> (7.9229, 29.1)
  line L8 (7.9229, 29.1) -> (9.63, 27.3929)
  line L9 (9.63, 27.3929) -> (9.63, 25.1)
  line L10 (9.63, 25.1) -> (-9.37, 25.1)
  line L11 (-9.37, 25.1) -> (-9.37, 27.3929)
  point P0 (0, 0)
  dimension "d107" = 0.5
extrude "돌출7" cut sketch "스케치7" against normal blind 5 contours L6 L7 L8 L9 L10 L11
properties part number "base"
